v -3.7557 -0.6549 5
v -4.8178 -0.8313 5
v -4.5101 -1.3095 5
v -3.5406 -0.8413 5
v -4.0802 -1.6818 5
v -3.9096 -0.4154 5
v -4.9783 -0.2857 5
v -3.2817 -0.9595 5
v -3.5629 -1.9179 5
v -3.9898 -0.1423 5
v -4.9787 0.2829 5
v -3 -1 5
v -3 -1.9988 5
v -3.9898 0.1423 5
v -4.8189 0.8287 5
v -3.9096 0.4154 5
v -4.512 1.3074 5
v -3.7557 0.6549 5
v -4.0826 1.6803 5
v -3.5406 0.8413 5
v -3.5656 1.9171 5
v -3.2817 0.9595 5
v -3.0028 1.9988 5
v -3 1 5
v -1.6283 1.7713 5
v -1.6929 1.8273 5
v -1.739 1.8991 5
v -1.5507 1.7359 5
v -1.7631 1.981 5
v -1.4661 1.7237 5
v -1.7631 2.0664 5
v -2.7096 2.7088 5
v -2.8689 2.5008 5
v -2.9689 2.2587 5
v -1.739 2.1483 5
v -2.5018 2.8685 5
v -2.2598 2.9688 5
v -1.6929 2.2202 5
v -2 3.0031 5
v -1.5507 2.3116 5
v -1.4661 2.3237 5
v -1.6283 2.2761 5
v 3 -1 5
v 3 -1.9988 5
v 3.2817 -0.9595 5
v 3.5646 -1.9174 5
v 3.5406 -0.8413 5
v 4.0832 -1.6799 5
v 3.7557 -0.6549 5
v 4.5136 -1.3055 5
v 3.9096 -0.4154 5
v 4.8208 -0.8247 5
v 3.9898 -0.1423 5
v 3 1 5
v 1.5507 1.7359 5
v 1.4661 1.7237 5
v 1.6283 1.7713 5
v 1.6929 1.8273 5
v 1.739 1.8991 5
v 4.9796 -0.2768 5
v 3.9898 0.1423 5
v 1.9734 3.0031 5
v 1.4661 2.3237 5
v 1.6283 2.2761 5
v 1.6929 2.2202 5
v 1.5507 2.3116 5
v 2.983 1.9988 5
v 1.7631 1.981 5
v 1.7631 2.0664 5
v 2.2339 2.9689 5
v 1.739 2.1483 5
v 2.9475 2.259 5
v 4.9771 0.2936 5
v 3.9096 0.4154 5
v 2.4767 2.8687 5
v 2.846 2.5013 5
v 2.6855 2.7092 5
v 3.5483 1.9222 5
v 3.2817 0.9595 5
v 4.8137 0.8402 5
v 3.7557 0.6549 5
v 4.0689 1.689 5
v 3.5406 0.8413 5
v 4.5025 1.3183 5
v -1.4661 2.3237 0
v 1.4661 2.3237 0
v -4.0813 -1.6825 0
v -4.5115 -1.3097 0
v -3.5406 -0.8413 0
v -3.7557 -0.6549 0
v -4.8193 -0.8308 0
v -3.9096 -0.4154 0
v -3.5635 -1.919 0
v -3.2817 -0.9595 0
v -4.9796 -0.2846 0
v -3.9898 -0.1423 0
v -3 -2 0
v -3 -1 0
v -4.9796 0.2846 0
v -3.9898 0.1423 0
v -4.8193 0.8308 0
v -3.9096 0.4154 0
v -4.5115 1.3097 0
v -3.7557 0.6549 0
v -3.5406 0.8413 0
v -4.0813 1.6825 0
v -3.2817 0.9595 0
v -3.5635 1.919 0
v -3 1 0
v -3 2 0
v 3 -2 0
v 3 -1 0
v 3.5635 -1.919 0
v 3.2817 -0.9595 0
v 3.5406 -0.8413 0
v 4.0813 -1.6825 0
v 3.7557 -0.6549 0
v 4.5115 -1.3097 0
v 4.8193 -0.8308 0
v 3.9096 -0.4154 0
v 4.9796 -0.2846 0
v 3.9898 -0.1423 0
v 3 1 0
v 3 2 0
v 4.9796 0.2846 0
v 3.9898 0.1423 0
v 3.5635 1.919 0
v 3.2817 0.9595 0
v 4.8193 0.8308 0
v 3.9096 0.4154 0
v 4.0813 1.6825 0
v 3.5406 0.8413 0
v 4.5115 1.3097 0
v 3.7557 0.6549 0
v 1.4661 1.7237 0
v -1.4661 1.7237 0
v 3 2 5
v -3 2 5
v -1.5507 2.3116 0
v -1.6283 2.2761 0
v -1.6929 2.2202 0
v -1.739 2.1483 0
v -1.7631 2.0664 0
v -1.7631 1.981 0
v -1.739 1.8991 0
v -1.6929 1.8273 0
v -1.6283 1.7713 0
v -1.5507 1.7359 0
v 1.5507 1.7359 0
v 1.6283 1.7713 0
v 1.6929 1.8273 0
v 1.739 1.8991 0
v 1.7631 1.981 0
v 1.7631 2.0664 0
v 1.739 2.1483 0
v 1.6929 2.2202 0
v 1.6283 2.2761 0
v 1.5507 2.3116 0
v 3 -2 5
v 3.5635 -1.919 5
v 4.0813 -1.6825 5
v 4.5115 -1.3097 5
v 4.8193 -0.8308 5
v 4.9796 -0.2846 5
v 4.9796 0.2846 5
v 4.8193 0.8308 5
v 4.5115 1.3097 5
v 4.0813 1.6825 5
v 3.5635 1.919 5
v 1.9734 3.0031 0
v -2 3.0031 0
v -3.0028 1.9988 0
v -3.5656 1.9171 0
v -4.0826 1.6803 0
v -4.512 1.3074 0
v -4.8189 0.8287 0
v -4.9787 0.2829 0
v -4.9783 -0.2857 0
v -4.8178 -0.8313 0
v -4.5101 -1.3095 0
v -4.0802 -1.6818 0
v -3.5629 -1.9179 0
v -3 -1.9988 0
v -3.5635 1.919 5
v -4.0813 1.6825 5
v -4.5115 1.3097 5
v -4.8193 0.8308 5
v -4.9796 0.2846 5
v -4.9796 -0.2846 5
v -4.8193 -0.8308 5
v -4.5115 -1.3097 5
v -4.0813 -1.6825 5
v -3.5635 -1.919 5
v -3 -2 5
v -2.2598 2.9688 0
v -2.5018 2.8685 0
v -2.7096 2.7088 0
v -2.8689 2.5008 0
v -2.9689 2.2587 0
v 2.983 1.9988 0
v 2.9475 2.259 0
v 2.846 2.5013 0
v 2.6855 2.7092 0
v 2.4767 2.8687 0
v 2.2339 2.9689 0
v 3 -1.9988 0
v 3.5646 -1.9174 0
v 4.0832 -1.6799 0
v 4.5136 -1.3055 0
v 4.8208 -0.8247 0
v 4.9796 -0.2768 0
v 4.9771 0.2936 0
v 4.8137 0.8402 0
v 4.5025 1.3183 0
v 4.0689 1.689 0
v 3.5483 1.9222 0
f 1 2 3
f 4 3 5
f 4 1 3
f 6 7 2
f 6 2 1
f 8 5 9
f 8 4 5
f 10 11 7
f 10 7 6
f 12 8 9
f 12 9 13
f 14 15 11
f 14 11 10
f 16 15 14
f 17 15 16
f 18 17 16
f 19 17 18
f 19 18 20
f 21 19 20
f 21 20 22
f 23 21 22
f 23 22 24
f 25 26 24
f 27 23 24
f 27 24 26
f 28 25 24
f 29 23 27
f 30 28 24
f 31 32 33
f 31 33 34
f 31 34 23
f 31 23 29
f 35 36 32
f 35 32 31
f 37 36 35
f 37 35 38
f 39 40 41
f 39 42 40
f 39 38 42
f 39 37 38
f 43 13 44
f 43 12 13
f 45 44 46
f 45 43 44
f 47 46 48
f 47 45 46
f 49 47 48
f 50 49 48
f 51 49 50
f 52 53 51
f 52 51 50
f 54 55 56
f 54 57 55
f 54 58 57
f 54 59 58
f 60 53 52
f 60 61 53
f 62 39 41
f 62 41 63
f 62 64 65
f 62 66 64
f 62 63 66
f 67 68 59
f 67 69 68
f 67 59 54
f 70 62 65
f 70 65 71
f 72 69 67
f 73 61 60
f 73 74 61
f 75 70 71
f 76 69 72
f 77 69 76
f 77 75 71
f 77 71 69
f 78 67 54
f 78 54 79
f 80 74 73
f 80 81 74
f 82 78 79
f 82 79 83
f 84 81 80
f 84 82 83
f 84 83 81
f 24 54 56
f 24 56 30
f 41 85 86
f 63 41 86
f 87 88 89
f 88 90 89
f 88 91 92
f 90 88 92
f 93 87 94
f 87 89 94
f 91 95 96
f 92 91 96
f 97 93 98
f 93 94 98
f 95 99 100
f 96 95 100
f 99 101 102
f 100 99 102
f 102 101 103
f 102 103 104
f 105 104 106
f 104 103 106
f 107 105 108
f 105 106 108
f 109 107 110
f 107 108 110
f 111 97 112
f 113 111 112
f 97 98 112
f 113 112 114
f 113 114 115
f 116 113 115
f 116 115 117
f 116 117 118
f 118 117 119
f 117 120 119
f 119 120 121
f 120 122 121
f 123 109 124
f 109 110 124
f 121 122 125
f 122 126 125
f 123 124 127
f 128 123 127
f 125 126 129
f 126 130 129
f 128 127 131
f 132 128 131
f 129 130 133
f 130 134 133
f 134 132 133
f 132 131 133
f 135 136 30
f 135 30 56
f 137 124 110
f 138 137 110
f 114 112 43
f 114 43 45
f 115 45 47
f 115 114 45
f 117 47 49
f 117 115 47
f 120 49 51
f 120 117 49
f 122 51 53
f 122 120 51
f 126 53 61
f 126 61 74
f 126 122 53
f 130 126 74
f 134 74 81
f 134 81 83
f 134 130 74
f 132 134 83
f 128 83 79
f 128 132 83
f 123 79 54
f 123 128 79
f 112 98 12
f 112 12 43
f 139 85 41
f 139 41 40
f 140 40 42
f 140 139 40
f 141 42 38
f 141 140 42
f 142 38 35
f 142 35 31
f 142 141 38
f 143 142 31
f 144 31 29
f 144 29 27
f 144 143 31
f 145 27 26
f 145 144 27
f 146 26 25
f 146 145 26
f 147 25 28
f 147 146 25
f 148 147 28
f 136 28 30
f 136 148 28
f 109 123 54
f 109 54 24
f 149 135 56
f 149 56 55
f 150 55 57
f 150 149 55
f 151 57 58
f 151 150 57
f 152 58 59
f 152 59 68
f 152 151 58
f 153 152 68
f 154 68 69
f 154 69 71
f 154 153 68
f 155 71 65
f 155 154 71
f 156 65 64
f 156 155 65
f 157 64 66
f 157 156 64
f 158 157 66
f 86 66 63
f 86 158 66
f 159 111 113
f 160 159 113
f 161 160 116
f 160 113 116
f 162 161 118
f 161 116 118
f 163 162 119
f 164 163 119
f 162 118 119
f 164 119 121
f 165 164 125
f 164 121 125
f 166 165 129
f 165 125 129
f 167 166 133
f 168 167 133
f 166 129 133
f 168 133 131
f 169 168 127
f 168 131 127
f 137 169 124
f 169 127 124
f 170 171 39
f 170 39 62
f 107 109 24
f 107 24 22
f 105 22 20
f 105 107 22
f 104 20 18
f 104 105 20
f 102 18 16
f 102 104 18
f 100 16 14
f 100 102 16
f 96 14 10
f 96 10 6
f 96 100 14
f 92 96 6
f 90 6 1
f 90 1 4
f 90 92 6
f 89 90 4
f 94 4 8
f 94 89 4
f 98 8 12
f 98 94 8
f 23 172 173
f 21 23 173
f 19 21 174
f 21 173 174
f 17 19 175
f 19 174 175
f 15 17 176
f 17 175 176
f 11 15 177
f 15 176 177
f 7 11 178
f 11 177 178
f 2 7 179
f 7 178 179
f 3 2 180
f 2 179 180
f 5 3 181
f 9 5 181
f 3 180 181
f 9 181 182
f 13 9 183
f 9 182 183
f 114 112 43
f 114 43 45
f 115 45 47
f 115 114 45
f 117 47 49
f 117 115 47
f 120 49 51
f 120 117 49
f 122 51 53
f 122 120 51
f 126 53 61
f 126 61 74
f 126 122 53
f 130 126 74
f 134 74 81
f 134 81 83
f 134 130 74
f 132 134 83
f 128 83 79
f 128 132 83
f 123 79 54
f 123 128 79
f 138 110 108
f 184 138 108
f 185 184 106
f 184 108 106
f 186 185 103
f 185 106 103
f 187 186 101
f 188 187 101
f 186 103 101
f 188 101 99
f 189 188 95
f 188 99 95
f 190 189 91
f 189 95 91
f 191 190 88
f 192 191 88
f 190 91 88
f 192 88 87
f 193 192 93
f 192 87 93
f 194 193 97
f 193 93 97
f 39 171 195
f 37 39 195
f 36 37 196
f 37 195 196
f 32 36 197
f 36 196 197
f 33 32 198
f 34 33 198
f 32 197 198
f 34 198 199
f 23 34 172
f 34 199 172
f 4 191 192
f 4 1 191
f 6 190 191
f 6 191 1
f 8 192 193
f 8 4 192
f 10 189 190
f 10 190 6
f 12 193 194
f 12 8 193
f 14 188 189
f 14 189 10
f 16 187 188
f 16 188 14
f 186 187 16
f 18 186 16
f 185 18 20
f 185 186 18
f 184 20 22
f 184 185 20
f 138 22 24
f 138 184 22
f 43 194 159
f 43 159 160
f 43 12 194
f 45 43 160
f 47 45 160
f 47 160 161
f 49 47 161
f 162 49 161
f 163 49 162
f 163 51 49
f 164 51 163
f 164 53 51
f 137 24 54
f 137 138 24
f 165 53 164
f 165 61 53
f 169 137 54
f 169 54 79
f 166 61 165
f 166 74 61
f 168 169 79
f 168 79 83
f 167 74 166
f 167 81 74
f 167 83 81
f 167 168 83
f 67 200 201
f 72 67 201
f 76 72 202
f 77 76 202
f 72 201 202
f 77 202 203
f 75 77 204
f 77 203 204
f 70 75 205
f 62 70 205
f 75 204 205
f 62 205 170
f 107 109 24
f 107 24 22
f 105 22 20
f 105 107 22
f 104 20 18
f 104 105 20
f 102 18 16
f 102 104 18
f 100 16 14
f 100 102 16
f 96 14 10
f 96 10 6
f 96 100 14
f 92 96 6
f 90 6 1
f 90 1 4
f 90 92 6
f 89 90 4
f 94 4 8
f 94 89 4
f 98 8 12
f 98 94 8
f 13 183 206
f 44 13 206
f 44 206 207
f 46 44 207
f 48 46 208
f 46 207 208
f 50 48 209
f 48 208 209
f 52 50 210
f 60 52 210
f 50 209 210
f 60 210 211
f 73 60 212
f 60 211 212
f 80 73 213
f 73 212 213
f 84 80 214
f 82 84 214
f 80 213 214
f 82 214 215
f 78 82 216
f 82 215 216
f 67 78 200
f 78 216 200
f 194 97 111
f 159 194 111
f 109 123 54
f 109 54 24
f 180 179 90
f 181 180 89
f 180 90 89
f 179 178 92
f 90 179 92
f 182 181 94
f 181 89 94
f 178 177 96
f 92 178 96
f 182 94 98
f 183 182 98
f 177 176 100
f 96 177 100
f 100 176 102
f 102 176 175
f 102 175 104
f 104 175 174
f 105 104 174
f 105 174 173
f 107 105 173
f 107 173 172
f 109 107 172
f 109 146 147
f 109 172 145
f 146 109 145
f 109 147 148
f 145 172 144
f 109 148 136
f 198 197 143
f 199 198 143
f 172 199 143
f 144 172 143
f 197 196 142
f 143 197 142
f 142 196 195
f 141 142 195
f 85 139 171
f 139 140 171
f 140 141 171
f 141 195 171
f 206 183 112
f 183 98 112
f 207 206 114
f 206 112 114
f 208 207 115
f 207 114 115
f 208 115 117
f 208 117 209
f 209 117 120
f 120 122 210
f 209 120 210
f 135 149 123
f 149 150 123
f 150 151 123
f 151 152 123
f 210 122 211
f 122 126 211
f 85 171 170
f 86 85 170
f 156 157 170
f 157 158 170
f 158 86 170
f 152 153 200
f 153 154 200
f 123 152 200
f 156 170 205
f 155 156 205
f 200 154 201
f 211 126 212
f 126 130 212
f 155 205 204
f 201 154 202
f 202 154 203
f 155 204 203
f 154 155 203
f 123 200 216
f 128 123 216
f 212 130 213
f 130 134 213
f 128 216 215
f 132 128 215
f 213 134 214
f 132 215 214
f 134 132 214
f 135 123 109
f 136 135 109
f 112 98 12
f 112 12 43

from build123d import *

# Parameters (mm, degrees)
PAD_DEPTH    = 5
PAD001_DEPTH = 5


with BuildPart() as single:
    # Sketch → Pad (new body)
    with BuildSketch(Plane.XY):
        with BuildLine():
            ThreePointArc((-3, 2), (-5, 0), (-3, -2))
            Line((-3, -2), (3, -2))
            ThreePointArc((3, -2), (5, 0), (3, 2))
            Line((3, 2), (-3, 2))
        make_face()
        with BuildLine():
            ThreePointArc((-3, 1), (-4, 0), (-3, -1))
            Line((-3, -1), (3, -1))
            ThreePointArc((3, -1), (4, 0), (3, 1))
            Line((3, 1), (-3, 1))
        make_face(mode=Mode.SUBTRACT)
    extrude(amount=PAD_DEPTH)


with BuildPart() as double:
    # Sketch001 → Pad001 (new body)
    with BuildSketch(Plane.XY):
        with BuildLine():
            ThreePointArc((-3.002814, 1.998831), (-4.998832, -0.001407), (-3, -1.998832))
            Line((-3, -1.998832), (3, -1.998832))
            ThreePointArc((3, -1.998832), (4.998814, 0.008482), (2.983037, 1.998761))
            ThreePointArc((2.983037, 1.998761), (2.685452, 2.709226), (1.973425, 3.003057))
            Line((-2, 3.003057), (1.973425, 3.003057))
            ThreePointArc((-2, 3.003057), (-2.709596, 2.70884), (-3.002814, 1.998831))
        make_face()
        with BuildLine():
            ThreePointArc((-3, 1), (-4, 0), (-3, -1))
            Line((-3, -1), (3, -1))
            ThreePointArc((3, -1), (4, 0), (3, 1))
            Line((3, 1), (-3, 1))
        make_face(mode=Mode.SUBTRACT)
        with BuildLine():
            ThreePointArc((-1.466142, 2.323719), (-1.766142, 2.023719), (-1.466142, 1.723719))
            Line((-1.466142, 1.723719), (1.466142, 1.723719))
            ThreePointArc((1.466142, 1.723719), (1.766142, 2.023719), (1.466142, 2.323719))
            Line((-1.466142, 2.323719), (1.466142, 2.323719))
        make_face(mode=Mode.SUBTRACT)
    extrude(amount=PAD001_DEPTH)


solid = Compound([single.part, double.part])
